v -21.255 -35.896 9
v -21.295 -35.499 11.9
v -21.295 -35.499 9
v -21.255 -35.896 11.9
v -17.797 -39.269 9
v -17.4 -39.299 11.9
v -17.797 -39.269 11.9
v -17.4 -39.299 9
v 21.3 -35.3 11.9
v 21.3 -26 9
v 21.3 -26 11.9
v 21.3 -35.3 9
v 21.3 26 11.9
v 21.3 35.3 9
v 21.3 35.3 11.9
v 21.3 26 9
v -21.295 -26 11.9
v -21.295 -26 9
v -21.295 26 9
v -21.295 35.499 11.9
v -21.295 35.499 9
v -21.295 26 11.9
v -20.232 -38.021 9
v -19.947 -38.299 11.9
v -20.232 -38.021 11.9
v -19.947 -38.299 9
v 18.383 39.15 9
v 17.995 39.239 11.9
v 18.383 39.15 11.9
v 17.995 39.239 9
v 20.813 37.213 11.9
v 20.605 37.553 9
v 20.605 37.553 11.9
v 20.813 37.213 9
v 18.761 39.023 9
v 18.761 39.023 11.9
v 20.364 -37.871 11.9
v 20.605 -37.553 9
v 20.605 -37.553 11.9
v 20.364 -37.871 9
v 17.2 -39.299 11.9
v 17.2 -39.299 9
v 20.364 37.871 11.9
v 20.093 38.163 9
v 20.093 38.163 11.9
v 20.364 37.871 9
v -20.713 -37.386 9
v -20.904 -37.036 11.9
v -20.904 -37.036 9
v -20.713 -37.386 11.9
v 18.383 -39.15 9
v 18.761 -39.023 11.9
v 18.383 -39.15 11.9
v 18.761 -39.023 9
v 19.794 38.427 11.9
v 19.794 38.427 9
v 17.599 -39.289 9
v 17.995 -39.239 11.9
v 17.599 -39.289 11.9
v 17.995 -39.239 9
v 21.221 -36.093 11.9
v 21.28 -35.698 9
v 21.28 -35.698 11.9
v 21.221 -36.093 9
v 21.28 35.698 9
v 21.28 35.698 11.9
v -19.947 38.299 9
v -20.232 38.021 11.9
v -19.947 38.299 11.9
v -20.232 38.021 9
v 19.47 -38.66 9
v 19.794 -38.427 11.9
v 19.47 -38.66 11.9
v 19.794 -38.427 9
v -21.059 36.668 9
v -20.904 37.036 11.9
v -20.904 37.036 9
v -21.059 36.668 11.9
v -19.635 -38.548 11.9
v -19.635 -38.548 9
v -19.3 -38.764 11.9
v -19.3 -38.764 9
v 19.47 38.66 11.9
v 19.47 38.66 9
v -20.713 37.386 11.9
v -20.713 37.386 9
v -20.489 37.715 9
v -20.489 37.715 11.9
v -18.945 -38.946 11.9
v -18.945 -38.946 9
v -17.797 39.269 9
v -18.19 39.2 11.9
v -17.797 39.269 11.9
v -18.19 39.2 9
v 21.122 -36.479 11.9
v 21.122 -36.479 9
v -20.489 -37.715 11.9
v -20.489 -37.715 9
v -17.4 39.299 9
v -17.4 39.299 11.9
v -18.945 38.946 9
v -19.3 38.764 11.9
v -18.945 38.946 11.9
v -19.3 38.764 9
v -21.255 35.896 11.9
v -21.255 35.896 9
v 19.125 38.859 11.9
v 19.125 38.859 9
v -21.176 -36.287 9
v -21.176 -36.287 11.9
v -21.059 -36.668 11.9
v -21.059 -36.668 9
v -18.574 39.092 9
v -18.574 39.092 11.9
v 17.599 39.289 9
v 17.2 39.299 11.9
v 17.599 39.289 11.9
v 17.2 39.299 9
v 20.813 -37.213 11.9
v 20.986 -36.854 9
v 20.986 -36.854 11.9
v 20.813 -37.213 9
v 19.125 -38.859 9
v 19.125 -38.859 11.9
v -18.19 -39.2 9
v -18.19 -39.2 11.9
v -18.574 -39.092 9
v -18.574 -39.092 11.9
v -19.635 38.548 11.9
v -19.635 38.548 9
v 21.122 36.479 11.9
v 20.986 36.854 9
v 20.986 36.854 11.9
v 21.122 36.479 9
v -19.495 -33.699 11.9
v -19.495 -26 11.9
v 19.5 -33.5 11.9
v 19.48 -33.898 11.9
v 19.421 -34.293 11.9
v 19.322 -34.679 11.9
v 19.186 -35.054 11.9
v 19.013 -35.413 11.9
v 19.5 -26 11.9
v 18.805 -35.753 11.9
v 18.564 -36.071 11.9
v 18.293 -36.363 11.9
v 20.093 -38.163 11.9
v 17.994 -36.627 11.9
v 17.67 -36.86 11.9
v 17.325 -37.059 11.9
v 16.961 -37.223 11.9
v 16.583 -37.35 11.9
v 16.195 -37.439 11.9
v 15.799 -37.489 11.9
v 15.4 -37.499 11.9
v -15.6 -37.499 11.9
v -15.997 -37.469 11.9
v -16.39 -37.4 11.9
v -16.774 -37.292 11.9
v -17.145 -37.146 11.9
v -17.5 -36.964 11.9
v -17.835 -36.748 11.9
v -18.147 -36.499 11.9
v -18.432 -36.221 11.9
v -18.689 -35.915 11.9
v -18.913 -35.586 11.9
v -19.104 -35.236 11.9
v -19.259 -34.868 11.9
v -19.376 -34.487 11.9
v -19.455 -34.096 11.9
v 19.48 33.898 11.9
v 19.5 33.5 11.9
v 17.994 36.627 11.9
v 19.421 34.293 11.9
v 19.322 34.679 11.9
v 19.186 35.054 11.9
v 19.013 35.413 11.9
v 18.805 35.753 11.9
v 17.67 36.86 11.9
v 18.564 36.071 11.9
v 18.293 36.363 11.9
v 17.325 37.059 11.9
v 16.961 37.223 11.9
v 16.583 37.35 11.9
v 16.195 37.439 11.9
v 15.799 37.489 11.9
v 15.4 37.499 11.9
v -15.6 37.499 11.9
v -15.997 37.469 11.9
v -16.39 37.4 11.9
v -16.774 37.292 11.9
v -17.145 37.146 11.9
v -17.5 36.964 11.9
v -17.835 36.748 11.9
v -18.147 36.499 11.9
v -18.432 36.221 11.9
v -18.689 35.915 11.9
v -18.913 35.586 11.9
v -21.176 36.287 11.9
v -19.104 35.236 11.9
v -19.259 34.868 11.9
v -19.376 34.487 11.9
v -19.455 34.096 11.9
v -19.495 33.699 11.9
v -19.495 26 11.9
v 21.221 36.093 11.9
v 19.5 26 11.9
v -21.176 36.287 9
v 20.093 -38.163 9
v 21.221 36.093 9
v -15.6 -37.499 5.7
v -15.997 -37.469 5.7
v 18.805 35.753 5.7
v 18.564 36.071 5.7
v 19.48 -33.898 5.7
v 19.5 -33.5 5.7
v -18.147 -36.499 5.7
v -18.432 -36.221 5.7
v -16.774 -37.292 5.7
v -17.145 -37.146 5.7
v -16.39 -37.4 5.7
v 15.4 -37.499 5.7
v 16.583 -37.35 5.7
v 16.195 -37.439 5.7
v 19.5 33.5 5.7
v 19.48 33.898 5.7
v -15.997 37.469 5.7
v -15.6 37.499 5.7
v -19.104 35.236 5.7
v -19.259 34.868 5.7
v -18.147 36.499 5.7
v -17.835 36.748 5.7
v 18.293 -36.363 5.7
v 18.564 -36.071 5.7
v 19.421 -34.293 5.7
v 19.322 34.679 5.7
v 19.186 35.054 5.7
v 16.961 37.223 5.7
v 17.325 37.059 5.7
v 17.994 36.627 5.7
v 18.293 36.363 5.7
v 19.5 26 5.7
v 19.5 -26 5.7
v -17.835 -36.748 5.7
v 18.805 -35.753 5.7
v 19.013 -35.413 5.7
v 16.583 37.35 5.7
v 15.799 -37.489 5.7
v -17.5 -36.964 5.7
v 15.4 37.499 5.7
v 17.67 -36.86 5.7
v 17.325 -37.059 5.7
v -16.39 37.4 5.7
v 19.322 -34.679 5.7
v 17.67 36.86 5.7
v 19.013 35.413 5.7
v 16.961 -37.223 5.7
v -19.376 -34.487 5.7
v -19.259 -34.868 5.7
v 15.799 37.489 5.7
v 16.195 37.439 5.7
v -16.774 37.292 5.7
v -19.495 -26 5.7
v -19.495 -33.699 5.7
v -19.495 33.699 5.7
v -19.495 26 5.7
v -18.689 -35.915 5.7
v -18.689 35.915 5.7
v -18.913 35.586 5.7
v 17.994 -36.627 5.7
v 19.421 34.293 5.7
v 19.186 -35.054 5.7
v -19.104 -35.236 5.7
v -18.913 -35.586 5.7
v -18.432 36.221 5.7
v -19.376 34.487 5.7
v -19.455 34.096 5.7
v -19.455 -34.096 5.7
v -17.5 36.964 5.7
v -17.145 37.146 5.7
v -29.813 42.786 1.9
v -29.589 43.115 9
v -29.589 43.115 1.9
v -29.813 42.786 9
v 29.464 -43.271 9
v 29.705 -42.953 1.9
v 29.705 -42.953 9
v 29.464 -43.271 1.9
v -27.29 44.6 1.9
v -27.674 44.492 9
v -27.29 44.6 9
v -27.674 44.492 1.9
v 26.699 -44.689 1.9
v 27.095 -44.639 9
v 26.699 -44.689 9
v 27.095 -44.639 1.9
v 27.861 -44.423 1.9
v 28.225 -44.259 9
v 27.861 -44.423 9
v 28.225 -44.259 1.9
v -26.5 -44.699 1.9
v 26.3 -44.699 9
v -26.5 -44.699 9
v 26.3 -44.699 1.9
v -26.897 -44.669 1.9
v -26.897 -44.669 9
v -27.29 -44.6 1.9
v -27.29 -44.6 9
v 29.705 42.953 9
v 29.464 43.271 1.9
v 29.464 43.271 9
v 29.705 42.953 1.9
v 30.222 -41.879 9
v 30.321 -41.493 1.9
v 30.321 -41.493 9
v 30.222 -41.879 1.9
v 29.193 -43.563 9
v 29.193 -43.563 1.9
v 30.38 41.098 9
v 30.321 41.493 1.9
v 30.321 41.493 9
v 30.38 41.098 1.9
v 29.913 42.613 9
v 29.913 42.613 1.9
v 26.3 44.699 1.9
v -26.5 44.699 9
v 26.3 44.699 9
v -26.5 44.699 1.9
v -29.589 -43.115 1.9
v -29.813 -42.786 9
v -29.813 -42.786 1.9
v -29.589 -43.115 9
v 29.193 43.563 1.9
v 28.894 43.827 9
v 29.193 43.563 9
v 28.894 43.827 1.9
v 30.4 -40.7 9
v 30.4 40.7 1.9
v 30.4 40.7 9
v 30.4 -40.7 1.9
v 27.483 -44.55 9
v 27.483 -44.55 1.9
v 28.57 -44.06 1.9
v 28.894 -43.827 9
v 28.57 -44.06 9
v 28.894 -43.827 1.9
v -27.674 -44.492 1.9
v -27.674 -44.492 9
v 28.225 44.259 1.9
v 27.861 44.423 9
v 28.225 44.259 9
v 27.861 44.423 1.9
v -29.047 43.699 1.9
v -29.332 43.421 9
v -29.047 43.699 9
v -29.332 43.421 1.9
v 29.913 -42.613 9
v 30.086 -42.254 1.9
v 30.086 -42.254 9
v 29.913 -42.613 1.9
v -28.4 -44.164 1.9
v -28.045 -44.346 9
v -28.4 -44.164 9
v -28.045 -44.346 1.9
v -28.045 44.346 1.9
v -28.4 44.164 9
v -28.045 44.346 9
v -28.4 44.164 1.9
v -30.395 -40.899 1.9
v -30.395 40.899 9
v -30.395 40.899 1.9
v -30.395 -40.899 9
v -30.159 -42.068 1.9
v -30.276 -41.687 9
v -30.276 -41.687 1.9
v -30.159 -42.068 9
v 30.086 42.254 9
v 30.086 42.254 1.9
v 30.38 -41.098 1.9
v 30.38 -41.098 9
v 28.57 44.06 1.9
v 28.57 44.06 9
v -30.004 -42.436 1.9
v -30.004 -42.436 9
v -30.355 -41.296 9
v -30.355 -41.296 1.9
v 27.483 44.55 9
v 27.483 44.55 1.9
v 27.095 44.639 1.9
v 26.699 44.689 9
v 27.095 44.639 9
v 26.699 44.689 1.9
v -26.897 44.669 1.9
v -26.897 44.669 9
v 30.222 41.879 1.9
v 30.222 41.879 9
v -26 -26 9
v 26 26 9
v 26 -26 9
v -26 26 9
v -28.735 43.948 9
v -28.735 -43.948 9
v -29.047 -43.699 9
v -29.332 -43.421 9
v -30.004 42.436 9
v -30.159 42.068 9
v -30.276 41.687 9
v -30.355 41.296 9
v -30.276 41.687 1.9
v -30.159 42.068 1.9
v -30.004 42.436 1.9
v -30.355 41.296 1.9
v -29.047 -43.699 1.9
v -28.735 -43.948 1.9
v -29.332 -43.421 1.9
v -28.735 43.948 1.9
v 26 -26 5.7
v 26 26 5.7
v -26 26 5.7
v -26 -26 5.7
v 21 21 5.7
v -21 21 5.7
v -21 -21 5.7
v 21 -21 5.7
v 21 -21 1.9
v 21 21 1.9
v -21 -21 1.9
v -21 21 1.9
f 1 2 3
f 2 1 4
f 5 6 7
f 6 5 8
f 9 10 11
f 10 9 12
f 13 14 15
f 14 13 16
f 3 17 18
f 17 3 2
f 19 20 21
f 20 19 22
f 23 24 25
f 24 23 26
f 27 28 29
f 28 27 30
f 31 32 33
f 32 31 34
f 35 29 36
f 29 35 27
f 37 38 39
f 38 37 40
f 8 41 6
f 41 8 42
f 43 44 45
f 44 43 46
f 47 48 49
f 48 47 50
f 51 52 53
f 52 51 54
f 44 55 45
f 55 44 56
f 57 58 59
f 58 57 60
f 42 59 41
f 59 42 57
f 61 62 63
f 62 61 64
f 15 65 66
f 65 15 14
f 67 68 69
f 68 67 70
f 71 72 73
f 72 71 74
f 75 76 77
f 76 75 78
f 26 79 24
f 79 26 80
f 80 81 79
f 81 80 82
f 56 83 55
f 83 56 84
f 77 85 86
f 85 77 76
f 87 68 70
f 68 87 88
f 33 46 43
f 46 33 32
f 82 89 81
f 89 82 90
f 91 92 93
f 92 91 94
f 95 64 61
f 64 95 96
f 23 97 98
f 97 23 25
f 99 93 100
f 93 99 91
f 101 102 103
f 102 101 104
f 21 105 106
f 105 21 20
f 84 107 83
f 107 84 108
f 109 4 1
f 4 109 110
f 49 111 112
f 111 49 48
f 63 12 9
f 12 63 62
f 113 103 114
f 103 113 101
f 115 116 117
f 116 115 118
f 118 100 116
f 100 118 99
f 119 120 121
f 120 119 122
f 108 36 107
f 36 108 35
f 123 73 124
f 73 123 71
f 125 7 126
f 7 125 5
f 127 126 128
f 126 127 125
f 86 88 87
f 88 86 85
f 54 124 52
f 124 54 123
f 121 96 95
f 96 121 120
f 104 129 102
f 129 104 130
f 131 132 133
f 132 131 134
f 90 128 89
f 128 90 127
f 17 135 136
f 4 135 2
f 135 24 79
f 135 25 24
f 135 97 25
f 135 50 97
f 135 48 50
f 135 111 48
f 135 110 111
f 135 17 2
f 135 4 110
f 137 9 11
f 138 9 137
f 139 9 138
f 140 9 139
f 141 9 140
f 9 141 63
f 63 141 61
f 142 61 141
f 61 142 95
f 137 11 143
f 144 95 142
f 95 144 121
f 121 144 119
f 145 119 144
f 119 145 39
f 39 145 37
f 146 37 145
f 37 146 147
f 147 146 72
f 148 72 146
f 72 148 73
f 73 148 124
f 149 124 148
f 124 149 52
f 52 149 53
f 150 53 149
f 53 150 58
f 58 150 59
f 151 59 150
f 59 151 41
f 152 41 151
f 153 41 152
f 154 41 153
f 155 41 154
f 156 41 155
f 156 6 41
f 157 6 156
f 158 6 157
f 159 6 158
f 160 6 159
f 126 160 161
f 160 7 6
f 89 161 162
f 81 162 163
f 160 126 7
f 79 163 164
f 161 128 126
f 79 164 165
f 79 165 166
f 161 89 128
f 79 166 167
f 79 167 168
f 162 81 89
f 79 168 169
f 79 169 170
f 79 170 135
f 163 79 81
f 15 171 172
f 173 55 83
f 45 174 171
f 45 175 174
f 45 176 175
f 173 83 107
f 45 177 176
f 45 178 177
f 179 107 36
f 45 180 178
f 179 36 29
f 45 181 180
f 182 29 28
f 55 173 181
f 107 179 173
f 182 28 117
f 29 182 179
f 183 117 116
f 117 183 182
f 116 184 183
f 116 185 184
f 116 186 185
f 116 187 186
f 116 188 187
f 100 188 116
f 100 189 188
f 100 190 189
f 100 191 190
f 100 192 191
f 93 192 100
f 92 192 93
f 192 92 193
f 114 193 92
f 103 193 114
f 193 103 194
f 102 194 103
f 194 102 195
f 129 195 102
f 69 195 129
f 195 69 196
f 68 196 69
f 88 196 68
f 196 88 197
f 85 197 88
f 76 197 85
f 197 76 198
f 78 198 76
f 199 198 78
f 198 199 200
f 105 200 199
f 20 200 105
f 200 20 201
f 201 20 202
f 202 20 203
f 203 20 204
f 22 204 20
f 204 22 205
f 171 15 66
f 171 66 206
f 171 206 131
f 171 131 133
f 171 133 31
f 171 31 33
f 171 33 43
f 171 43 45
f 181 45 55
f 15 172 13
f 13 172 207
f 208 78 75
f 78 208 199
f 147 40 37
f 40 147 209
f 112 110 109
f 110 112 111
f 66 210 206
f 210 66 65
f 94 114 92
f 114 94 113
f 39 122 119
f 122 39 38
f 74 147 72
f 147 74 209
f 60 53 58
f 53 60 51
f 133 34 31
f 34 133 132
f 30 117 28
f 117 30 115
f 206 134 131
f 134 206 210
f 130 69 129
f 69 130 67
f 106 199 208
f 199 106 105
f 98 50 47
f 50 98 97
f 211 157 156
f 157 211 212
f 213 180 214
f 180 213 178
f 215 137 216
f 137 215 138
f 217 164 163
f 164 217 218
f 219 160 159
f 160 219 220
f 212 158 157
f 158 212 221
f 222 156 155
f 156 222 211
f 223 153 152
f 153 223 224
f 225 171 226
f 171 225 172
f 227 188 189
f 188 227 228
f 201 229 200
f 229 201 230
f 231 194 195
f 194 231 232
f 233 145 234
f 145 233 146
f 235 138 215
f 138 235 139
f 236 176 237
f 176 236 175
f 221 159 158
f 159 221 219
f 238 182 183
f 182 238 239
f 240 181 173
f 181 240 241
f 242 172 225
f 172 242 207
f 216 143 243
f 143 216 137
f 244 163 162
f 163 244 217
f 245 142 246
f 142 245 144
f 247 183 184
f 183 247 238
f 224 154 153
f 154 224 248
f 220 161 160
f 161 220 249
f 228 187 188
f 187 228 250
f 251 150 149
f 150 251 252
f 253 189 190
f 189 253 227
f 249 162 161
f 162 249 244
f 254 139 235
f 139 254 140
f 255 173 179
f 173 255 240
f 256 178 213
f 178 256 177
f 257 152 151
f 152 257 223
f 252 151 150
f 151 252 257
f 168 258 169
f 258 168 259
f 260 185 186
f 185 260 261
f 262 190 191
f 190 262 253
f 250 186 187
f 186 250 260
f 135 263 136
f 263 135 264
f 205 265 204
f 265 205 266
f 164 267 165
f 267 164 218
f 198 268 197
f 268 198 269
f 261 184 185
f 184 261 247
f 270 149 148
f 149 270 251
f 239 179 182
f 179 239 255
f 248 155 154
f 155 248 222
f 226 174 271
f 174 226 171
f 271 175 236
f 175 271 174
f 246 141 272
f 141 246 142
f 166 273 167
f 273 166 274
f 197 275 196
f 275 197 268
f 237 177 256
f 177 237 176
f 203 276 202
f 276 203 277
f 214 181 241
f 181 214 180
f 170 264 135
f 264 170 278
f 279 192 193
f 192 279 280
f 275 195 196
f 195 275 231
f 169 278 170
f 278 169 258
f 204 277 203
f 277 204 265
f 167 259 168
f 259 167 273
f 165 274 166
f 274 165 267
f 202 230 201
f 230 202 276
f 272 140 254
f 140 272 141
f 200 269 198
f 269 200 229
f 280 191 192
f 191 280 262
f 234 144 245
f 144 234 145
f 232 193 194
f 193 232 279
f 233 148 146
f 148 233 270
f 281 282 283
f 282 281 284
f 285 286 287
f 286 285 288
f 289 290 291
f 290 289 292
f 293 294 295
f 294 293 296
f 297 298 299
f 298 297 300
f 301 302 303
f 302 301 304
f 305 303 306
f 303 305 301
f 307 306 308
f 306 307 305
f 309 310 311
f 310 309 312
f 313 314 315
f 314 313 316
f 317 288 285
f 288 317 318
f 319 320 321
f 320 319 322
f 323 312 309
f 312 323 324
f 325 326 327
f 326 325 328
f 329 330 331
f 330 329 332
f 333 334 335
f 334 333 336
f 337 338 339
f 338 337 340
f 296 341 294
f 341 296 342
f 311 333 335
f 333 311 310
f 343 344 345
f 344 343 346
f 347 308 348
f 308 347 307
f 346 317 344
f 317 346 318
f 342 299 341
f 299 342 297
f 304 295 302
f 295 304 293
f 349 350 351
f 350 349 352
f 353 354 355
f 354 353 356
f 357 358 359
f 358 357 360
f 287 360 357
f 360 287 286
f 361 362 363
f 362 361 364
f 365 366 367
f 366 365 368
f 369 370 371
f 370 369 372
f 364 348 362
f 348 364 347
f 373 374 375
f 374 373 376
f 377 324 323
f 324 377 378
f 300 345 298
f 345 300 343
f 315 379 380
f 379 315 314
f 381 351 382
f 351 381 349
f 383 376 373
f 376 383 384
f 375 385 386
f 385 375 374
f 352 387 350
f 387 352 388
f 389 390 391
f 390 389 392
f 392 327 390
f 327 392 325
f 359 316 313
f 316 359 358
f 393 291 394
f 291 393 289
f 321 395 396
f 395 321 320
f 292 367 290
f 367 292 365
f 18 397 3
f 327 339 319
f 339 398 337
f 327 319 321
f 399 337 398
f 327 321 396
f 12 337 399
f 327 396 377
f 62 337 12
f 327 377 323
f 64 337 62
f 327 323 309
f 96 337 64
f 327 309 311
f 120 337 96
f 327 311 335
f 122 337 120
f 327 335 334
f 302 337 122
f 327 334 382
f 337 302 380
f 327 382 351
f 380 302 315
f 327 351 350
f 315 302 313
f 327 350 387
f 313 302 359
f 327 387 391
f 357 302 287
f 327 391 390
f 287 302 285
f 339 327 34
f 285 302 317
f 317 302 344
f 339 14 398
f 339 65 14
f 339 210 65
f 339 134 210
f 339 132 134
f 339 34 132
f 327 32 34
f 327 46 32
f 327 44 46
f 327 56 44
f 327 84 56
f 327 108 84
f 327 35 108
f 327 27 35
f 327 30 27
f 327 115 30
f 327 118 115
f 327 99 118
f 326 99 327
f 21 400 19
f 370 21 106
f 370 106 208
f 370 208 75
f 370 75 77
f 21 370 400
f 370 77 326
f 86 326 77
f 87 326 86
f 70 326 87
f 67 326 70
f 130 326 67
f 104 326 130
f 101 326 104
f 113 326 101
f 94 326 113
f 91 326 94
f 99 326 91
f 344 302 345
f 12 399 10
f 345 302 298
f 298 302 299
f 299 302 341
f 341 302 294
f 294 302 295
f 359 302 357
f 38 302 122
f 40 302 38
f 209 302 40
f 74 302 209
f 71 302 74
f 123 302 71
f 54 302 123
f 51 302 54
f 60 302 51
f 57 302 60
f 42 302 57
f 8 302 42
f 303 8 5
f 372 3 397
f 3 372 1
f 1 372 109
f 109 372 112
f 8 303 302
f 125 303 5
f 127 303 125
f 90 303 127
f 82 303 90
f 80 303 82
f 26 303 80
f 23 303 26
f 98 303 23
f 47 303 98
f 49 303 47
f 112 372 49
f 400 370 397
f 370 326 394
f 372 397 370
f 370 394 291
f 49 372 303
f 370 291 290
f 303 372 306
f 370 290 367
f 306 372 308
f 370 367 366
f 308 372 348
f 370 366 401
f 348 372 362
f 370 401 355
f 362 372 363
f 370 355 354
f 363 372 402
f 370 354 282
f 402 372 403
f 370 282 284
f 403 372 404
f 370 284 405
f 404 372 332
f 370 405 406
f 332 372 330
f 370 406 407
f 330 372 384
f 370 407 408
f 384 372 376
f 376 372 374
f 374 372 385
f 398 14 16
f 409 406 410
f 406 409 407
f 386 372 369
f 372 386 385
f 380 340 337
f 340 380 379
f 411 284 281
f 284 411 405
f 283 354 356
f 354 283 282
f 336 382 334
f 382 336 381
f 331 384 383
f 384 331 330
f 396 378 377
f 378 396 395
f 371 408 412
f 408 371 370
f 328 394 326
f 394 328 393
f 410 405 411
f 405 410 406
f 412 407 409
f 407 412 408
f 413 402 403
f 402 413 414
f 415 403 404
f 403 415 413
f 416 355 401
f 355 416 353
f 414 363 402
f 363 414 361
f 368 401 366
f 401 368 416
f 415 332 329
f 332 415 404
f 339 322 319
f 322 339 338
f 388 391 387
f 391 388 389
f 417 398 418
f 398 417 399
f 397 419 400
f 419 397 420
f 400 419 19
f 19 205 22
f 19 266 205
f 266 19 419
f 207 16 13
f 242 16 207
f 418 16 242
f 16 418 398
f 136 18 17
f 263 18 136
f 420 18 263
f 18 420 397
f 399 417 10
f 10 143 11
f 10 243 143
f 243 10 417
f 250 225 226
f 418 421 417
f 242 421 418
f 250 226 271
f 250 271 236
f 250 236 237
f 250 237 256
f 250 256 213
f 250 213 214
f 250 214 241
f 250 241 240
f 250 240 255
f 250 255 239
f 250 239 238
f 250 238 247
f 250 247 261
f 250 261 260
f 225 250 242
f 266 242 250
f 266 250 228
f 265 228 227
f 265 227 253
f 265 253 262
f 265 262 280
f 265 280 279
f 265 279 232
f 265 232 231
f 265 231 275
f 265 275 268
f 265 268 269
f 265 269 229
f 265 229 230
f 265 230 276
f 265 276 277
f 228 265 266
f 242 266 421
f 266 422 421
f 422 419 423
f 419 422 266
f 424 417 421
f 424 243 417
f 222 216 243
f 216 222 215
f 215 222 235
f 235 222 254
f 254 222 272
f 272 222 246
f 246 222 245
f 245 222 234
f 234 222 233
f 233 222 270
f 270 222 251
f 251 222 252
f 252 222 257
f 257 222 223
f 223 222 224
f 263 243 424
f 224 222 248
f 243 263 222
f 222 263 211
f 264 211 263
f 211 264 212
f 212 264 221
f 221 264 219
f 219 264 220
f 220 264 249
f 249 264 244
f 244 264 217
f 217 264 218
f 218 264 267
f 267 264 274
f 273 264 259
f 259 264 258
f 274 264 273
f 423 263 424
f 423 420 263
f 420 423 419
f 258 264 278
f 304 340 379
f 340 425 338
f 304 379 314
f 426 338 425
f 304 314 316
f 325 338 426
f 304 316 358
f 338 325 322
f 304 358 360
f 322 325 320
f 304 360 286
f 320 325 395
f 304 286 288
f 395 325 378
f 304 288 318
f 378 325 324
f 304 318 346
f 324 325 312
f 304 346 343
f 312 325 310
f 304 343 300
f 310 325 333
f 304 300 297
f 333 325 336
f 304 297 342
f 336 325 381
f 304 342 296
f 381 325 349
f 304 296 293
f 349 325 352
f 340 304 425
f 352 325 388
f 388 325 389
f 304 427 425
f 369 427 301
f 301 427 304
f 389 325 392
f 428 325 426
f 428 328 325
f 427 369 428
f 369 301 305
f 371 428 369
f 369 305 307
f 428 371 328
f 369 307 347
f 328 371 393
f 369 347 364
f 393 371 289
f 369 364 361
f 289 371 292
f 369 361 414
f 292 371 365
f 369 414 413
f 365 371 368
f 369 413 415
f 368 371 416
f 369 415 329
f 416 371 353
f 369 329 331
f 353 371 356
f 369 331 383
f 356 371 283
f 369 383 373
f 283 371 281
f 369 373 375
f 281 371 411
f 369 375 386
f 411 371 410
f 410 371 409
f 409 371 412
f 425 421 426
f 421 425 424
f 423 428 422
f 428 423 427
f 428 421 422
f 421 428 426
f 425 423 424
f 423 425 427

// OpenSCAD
// possible case dimensions
case_dims_35mk2 = [60.8, 89.4];
case_dims_3x4mk2 = [106.5, 133.2];

// select desired case dimensions
case_dims = case_dims_35mk2; 

// better resolution
$fa = 1;
$fs = 0.4;

// outside shape
outerx = case_dims[0];
outery = case_dims[1];
outerz = 3.8;

// overlap
smalloverlap = 2;

// raised edge (fits into piece above)
innerx = 42.6;
innery = 78.6;
innerz = 3.2;

// width of the raised edge
windowwidth = 1.8;

// inner dimensions of the raised edge
innerwindowx = innerx - windowwidth*2;
innerwindowy = innery - windowwidth*2;

// a height big enough to make a cut out with difference
cutoutz = 15;

// dimensions of the cutout for the slide
outer_slidexy = 52;
inner_slide_lip = 5;

// radius for the curved corners 
curveradius = 4;

// define modules

module rounded_rect_prism(x, y, z, r1) {
    hull() {
        translate([x/2 - r1, y/2 - r1, 0])
            cylinder(z, r1, r1, center = true);
        translate([-x/2 + r1, y/2 - r1, 0])
            cylinder(z, r1, r1, center = true);
        translate([-x/2 + r1, -y/2 + r1, 0])
            cylinder(z, r1, r1, center = true);
        translate([x/2 - r1, -y/2 + r1, 0])
            cylinder(z, r1, r1, center = true);
    }
}

module bottom() {
    difference() {
        // base plate
        rounded_rect_prism(outerx, outery, outerz, curveradius);
        // window for slide light
        cube([outer_slidexy - 2*inner_slide_lip, outer_slidexy - 2*inner_slide_lip, cutoutz], center = true);
    }
}

module connecting_lip() {
    difference() {
        rounded_rect_prism(innerx, innery, innerz + smalloverlap, curveradius);
        rounded_rect_prism(innerwindowx, innerwindowy, cutoutz, curveradius);
    }
}

module top() {
    difference() {
        // base plate
        union() {
            rounded_rect_prism(outerx, outery, outerz, curveradius);
            translate([0, 0, innerz - smalloverlap/2]) connecting_lip();
        }
        // cut out for fingies
        rounded_rect_prism(innerwindowx, innerwindowy, cutoutz, curveradius);
        // cut out for slide
        cube([outer_slidexy, outer_slidexy, cutoutz], center = true);
    }
}

// build it
        
     

union() {
    translate([0, 0, outerz*2 - smalloverlap/4]) top();
    translate([0, 0, outerz]) bottom();
}
